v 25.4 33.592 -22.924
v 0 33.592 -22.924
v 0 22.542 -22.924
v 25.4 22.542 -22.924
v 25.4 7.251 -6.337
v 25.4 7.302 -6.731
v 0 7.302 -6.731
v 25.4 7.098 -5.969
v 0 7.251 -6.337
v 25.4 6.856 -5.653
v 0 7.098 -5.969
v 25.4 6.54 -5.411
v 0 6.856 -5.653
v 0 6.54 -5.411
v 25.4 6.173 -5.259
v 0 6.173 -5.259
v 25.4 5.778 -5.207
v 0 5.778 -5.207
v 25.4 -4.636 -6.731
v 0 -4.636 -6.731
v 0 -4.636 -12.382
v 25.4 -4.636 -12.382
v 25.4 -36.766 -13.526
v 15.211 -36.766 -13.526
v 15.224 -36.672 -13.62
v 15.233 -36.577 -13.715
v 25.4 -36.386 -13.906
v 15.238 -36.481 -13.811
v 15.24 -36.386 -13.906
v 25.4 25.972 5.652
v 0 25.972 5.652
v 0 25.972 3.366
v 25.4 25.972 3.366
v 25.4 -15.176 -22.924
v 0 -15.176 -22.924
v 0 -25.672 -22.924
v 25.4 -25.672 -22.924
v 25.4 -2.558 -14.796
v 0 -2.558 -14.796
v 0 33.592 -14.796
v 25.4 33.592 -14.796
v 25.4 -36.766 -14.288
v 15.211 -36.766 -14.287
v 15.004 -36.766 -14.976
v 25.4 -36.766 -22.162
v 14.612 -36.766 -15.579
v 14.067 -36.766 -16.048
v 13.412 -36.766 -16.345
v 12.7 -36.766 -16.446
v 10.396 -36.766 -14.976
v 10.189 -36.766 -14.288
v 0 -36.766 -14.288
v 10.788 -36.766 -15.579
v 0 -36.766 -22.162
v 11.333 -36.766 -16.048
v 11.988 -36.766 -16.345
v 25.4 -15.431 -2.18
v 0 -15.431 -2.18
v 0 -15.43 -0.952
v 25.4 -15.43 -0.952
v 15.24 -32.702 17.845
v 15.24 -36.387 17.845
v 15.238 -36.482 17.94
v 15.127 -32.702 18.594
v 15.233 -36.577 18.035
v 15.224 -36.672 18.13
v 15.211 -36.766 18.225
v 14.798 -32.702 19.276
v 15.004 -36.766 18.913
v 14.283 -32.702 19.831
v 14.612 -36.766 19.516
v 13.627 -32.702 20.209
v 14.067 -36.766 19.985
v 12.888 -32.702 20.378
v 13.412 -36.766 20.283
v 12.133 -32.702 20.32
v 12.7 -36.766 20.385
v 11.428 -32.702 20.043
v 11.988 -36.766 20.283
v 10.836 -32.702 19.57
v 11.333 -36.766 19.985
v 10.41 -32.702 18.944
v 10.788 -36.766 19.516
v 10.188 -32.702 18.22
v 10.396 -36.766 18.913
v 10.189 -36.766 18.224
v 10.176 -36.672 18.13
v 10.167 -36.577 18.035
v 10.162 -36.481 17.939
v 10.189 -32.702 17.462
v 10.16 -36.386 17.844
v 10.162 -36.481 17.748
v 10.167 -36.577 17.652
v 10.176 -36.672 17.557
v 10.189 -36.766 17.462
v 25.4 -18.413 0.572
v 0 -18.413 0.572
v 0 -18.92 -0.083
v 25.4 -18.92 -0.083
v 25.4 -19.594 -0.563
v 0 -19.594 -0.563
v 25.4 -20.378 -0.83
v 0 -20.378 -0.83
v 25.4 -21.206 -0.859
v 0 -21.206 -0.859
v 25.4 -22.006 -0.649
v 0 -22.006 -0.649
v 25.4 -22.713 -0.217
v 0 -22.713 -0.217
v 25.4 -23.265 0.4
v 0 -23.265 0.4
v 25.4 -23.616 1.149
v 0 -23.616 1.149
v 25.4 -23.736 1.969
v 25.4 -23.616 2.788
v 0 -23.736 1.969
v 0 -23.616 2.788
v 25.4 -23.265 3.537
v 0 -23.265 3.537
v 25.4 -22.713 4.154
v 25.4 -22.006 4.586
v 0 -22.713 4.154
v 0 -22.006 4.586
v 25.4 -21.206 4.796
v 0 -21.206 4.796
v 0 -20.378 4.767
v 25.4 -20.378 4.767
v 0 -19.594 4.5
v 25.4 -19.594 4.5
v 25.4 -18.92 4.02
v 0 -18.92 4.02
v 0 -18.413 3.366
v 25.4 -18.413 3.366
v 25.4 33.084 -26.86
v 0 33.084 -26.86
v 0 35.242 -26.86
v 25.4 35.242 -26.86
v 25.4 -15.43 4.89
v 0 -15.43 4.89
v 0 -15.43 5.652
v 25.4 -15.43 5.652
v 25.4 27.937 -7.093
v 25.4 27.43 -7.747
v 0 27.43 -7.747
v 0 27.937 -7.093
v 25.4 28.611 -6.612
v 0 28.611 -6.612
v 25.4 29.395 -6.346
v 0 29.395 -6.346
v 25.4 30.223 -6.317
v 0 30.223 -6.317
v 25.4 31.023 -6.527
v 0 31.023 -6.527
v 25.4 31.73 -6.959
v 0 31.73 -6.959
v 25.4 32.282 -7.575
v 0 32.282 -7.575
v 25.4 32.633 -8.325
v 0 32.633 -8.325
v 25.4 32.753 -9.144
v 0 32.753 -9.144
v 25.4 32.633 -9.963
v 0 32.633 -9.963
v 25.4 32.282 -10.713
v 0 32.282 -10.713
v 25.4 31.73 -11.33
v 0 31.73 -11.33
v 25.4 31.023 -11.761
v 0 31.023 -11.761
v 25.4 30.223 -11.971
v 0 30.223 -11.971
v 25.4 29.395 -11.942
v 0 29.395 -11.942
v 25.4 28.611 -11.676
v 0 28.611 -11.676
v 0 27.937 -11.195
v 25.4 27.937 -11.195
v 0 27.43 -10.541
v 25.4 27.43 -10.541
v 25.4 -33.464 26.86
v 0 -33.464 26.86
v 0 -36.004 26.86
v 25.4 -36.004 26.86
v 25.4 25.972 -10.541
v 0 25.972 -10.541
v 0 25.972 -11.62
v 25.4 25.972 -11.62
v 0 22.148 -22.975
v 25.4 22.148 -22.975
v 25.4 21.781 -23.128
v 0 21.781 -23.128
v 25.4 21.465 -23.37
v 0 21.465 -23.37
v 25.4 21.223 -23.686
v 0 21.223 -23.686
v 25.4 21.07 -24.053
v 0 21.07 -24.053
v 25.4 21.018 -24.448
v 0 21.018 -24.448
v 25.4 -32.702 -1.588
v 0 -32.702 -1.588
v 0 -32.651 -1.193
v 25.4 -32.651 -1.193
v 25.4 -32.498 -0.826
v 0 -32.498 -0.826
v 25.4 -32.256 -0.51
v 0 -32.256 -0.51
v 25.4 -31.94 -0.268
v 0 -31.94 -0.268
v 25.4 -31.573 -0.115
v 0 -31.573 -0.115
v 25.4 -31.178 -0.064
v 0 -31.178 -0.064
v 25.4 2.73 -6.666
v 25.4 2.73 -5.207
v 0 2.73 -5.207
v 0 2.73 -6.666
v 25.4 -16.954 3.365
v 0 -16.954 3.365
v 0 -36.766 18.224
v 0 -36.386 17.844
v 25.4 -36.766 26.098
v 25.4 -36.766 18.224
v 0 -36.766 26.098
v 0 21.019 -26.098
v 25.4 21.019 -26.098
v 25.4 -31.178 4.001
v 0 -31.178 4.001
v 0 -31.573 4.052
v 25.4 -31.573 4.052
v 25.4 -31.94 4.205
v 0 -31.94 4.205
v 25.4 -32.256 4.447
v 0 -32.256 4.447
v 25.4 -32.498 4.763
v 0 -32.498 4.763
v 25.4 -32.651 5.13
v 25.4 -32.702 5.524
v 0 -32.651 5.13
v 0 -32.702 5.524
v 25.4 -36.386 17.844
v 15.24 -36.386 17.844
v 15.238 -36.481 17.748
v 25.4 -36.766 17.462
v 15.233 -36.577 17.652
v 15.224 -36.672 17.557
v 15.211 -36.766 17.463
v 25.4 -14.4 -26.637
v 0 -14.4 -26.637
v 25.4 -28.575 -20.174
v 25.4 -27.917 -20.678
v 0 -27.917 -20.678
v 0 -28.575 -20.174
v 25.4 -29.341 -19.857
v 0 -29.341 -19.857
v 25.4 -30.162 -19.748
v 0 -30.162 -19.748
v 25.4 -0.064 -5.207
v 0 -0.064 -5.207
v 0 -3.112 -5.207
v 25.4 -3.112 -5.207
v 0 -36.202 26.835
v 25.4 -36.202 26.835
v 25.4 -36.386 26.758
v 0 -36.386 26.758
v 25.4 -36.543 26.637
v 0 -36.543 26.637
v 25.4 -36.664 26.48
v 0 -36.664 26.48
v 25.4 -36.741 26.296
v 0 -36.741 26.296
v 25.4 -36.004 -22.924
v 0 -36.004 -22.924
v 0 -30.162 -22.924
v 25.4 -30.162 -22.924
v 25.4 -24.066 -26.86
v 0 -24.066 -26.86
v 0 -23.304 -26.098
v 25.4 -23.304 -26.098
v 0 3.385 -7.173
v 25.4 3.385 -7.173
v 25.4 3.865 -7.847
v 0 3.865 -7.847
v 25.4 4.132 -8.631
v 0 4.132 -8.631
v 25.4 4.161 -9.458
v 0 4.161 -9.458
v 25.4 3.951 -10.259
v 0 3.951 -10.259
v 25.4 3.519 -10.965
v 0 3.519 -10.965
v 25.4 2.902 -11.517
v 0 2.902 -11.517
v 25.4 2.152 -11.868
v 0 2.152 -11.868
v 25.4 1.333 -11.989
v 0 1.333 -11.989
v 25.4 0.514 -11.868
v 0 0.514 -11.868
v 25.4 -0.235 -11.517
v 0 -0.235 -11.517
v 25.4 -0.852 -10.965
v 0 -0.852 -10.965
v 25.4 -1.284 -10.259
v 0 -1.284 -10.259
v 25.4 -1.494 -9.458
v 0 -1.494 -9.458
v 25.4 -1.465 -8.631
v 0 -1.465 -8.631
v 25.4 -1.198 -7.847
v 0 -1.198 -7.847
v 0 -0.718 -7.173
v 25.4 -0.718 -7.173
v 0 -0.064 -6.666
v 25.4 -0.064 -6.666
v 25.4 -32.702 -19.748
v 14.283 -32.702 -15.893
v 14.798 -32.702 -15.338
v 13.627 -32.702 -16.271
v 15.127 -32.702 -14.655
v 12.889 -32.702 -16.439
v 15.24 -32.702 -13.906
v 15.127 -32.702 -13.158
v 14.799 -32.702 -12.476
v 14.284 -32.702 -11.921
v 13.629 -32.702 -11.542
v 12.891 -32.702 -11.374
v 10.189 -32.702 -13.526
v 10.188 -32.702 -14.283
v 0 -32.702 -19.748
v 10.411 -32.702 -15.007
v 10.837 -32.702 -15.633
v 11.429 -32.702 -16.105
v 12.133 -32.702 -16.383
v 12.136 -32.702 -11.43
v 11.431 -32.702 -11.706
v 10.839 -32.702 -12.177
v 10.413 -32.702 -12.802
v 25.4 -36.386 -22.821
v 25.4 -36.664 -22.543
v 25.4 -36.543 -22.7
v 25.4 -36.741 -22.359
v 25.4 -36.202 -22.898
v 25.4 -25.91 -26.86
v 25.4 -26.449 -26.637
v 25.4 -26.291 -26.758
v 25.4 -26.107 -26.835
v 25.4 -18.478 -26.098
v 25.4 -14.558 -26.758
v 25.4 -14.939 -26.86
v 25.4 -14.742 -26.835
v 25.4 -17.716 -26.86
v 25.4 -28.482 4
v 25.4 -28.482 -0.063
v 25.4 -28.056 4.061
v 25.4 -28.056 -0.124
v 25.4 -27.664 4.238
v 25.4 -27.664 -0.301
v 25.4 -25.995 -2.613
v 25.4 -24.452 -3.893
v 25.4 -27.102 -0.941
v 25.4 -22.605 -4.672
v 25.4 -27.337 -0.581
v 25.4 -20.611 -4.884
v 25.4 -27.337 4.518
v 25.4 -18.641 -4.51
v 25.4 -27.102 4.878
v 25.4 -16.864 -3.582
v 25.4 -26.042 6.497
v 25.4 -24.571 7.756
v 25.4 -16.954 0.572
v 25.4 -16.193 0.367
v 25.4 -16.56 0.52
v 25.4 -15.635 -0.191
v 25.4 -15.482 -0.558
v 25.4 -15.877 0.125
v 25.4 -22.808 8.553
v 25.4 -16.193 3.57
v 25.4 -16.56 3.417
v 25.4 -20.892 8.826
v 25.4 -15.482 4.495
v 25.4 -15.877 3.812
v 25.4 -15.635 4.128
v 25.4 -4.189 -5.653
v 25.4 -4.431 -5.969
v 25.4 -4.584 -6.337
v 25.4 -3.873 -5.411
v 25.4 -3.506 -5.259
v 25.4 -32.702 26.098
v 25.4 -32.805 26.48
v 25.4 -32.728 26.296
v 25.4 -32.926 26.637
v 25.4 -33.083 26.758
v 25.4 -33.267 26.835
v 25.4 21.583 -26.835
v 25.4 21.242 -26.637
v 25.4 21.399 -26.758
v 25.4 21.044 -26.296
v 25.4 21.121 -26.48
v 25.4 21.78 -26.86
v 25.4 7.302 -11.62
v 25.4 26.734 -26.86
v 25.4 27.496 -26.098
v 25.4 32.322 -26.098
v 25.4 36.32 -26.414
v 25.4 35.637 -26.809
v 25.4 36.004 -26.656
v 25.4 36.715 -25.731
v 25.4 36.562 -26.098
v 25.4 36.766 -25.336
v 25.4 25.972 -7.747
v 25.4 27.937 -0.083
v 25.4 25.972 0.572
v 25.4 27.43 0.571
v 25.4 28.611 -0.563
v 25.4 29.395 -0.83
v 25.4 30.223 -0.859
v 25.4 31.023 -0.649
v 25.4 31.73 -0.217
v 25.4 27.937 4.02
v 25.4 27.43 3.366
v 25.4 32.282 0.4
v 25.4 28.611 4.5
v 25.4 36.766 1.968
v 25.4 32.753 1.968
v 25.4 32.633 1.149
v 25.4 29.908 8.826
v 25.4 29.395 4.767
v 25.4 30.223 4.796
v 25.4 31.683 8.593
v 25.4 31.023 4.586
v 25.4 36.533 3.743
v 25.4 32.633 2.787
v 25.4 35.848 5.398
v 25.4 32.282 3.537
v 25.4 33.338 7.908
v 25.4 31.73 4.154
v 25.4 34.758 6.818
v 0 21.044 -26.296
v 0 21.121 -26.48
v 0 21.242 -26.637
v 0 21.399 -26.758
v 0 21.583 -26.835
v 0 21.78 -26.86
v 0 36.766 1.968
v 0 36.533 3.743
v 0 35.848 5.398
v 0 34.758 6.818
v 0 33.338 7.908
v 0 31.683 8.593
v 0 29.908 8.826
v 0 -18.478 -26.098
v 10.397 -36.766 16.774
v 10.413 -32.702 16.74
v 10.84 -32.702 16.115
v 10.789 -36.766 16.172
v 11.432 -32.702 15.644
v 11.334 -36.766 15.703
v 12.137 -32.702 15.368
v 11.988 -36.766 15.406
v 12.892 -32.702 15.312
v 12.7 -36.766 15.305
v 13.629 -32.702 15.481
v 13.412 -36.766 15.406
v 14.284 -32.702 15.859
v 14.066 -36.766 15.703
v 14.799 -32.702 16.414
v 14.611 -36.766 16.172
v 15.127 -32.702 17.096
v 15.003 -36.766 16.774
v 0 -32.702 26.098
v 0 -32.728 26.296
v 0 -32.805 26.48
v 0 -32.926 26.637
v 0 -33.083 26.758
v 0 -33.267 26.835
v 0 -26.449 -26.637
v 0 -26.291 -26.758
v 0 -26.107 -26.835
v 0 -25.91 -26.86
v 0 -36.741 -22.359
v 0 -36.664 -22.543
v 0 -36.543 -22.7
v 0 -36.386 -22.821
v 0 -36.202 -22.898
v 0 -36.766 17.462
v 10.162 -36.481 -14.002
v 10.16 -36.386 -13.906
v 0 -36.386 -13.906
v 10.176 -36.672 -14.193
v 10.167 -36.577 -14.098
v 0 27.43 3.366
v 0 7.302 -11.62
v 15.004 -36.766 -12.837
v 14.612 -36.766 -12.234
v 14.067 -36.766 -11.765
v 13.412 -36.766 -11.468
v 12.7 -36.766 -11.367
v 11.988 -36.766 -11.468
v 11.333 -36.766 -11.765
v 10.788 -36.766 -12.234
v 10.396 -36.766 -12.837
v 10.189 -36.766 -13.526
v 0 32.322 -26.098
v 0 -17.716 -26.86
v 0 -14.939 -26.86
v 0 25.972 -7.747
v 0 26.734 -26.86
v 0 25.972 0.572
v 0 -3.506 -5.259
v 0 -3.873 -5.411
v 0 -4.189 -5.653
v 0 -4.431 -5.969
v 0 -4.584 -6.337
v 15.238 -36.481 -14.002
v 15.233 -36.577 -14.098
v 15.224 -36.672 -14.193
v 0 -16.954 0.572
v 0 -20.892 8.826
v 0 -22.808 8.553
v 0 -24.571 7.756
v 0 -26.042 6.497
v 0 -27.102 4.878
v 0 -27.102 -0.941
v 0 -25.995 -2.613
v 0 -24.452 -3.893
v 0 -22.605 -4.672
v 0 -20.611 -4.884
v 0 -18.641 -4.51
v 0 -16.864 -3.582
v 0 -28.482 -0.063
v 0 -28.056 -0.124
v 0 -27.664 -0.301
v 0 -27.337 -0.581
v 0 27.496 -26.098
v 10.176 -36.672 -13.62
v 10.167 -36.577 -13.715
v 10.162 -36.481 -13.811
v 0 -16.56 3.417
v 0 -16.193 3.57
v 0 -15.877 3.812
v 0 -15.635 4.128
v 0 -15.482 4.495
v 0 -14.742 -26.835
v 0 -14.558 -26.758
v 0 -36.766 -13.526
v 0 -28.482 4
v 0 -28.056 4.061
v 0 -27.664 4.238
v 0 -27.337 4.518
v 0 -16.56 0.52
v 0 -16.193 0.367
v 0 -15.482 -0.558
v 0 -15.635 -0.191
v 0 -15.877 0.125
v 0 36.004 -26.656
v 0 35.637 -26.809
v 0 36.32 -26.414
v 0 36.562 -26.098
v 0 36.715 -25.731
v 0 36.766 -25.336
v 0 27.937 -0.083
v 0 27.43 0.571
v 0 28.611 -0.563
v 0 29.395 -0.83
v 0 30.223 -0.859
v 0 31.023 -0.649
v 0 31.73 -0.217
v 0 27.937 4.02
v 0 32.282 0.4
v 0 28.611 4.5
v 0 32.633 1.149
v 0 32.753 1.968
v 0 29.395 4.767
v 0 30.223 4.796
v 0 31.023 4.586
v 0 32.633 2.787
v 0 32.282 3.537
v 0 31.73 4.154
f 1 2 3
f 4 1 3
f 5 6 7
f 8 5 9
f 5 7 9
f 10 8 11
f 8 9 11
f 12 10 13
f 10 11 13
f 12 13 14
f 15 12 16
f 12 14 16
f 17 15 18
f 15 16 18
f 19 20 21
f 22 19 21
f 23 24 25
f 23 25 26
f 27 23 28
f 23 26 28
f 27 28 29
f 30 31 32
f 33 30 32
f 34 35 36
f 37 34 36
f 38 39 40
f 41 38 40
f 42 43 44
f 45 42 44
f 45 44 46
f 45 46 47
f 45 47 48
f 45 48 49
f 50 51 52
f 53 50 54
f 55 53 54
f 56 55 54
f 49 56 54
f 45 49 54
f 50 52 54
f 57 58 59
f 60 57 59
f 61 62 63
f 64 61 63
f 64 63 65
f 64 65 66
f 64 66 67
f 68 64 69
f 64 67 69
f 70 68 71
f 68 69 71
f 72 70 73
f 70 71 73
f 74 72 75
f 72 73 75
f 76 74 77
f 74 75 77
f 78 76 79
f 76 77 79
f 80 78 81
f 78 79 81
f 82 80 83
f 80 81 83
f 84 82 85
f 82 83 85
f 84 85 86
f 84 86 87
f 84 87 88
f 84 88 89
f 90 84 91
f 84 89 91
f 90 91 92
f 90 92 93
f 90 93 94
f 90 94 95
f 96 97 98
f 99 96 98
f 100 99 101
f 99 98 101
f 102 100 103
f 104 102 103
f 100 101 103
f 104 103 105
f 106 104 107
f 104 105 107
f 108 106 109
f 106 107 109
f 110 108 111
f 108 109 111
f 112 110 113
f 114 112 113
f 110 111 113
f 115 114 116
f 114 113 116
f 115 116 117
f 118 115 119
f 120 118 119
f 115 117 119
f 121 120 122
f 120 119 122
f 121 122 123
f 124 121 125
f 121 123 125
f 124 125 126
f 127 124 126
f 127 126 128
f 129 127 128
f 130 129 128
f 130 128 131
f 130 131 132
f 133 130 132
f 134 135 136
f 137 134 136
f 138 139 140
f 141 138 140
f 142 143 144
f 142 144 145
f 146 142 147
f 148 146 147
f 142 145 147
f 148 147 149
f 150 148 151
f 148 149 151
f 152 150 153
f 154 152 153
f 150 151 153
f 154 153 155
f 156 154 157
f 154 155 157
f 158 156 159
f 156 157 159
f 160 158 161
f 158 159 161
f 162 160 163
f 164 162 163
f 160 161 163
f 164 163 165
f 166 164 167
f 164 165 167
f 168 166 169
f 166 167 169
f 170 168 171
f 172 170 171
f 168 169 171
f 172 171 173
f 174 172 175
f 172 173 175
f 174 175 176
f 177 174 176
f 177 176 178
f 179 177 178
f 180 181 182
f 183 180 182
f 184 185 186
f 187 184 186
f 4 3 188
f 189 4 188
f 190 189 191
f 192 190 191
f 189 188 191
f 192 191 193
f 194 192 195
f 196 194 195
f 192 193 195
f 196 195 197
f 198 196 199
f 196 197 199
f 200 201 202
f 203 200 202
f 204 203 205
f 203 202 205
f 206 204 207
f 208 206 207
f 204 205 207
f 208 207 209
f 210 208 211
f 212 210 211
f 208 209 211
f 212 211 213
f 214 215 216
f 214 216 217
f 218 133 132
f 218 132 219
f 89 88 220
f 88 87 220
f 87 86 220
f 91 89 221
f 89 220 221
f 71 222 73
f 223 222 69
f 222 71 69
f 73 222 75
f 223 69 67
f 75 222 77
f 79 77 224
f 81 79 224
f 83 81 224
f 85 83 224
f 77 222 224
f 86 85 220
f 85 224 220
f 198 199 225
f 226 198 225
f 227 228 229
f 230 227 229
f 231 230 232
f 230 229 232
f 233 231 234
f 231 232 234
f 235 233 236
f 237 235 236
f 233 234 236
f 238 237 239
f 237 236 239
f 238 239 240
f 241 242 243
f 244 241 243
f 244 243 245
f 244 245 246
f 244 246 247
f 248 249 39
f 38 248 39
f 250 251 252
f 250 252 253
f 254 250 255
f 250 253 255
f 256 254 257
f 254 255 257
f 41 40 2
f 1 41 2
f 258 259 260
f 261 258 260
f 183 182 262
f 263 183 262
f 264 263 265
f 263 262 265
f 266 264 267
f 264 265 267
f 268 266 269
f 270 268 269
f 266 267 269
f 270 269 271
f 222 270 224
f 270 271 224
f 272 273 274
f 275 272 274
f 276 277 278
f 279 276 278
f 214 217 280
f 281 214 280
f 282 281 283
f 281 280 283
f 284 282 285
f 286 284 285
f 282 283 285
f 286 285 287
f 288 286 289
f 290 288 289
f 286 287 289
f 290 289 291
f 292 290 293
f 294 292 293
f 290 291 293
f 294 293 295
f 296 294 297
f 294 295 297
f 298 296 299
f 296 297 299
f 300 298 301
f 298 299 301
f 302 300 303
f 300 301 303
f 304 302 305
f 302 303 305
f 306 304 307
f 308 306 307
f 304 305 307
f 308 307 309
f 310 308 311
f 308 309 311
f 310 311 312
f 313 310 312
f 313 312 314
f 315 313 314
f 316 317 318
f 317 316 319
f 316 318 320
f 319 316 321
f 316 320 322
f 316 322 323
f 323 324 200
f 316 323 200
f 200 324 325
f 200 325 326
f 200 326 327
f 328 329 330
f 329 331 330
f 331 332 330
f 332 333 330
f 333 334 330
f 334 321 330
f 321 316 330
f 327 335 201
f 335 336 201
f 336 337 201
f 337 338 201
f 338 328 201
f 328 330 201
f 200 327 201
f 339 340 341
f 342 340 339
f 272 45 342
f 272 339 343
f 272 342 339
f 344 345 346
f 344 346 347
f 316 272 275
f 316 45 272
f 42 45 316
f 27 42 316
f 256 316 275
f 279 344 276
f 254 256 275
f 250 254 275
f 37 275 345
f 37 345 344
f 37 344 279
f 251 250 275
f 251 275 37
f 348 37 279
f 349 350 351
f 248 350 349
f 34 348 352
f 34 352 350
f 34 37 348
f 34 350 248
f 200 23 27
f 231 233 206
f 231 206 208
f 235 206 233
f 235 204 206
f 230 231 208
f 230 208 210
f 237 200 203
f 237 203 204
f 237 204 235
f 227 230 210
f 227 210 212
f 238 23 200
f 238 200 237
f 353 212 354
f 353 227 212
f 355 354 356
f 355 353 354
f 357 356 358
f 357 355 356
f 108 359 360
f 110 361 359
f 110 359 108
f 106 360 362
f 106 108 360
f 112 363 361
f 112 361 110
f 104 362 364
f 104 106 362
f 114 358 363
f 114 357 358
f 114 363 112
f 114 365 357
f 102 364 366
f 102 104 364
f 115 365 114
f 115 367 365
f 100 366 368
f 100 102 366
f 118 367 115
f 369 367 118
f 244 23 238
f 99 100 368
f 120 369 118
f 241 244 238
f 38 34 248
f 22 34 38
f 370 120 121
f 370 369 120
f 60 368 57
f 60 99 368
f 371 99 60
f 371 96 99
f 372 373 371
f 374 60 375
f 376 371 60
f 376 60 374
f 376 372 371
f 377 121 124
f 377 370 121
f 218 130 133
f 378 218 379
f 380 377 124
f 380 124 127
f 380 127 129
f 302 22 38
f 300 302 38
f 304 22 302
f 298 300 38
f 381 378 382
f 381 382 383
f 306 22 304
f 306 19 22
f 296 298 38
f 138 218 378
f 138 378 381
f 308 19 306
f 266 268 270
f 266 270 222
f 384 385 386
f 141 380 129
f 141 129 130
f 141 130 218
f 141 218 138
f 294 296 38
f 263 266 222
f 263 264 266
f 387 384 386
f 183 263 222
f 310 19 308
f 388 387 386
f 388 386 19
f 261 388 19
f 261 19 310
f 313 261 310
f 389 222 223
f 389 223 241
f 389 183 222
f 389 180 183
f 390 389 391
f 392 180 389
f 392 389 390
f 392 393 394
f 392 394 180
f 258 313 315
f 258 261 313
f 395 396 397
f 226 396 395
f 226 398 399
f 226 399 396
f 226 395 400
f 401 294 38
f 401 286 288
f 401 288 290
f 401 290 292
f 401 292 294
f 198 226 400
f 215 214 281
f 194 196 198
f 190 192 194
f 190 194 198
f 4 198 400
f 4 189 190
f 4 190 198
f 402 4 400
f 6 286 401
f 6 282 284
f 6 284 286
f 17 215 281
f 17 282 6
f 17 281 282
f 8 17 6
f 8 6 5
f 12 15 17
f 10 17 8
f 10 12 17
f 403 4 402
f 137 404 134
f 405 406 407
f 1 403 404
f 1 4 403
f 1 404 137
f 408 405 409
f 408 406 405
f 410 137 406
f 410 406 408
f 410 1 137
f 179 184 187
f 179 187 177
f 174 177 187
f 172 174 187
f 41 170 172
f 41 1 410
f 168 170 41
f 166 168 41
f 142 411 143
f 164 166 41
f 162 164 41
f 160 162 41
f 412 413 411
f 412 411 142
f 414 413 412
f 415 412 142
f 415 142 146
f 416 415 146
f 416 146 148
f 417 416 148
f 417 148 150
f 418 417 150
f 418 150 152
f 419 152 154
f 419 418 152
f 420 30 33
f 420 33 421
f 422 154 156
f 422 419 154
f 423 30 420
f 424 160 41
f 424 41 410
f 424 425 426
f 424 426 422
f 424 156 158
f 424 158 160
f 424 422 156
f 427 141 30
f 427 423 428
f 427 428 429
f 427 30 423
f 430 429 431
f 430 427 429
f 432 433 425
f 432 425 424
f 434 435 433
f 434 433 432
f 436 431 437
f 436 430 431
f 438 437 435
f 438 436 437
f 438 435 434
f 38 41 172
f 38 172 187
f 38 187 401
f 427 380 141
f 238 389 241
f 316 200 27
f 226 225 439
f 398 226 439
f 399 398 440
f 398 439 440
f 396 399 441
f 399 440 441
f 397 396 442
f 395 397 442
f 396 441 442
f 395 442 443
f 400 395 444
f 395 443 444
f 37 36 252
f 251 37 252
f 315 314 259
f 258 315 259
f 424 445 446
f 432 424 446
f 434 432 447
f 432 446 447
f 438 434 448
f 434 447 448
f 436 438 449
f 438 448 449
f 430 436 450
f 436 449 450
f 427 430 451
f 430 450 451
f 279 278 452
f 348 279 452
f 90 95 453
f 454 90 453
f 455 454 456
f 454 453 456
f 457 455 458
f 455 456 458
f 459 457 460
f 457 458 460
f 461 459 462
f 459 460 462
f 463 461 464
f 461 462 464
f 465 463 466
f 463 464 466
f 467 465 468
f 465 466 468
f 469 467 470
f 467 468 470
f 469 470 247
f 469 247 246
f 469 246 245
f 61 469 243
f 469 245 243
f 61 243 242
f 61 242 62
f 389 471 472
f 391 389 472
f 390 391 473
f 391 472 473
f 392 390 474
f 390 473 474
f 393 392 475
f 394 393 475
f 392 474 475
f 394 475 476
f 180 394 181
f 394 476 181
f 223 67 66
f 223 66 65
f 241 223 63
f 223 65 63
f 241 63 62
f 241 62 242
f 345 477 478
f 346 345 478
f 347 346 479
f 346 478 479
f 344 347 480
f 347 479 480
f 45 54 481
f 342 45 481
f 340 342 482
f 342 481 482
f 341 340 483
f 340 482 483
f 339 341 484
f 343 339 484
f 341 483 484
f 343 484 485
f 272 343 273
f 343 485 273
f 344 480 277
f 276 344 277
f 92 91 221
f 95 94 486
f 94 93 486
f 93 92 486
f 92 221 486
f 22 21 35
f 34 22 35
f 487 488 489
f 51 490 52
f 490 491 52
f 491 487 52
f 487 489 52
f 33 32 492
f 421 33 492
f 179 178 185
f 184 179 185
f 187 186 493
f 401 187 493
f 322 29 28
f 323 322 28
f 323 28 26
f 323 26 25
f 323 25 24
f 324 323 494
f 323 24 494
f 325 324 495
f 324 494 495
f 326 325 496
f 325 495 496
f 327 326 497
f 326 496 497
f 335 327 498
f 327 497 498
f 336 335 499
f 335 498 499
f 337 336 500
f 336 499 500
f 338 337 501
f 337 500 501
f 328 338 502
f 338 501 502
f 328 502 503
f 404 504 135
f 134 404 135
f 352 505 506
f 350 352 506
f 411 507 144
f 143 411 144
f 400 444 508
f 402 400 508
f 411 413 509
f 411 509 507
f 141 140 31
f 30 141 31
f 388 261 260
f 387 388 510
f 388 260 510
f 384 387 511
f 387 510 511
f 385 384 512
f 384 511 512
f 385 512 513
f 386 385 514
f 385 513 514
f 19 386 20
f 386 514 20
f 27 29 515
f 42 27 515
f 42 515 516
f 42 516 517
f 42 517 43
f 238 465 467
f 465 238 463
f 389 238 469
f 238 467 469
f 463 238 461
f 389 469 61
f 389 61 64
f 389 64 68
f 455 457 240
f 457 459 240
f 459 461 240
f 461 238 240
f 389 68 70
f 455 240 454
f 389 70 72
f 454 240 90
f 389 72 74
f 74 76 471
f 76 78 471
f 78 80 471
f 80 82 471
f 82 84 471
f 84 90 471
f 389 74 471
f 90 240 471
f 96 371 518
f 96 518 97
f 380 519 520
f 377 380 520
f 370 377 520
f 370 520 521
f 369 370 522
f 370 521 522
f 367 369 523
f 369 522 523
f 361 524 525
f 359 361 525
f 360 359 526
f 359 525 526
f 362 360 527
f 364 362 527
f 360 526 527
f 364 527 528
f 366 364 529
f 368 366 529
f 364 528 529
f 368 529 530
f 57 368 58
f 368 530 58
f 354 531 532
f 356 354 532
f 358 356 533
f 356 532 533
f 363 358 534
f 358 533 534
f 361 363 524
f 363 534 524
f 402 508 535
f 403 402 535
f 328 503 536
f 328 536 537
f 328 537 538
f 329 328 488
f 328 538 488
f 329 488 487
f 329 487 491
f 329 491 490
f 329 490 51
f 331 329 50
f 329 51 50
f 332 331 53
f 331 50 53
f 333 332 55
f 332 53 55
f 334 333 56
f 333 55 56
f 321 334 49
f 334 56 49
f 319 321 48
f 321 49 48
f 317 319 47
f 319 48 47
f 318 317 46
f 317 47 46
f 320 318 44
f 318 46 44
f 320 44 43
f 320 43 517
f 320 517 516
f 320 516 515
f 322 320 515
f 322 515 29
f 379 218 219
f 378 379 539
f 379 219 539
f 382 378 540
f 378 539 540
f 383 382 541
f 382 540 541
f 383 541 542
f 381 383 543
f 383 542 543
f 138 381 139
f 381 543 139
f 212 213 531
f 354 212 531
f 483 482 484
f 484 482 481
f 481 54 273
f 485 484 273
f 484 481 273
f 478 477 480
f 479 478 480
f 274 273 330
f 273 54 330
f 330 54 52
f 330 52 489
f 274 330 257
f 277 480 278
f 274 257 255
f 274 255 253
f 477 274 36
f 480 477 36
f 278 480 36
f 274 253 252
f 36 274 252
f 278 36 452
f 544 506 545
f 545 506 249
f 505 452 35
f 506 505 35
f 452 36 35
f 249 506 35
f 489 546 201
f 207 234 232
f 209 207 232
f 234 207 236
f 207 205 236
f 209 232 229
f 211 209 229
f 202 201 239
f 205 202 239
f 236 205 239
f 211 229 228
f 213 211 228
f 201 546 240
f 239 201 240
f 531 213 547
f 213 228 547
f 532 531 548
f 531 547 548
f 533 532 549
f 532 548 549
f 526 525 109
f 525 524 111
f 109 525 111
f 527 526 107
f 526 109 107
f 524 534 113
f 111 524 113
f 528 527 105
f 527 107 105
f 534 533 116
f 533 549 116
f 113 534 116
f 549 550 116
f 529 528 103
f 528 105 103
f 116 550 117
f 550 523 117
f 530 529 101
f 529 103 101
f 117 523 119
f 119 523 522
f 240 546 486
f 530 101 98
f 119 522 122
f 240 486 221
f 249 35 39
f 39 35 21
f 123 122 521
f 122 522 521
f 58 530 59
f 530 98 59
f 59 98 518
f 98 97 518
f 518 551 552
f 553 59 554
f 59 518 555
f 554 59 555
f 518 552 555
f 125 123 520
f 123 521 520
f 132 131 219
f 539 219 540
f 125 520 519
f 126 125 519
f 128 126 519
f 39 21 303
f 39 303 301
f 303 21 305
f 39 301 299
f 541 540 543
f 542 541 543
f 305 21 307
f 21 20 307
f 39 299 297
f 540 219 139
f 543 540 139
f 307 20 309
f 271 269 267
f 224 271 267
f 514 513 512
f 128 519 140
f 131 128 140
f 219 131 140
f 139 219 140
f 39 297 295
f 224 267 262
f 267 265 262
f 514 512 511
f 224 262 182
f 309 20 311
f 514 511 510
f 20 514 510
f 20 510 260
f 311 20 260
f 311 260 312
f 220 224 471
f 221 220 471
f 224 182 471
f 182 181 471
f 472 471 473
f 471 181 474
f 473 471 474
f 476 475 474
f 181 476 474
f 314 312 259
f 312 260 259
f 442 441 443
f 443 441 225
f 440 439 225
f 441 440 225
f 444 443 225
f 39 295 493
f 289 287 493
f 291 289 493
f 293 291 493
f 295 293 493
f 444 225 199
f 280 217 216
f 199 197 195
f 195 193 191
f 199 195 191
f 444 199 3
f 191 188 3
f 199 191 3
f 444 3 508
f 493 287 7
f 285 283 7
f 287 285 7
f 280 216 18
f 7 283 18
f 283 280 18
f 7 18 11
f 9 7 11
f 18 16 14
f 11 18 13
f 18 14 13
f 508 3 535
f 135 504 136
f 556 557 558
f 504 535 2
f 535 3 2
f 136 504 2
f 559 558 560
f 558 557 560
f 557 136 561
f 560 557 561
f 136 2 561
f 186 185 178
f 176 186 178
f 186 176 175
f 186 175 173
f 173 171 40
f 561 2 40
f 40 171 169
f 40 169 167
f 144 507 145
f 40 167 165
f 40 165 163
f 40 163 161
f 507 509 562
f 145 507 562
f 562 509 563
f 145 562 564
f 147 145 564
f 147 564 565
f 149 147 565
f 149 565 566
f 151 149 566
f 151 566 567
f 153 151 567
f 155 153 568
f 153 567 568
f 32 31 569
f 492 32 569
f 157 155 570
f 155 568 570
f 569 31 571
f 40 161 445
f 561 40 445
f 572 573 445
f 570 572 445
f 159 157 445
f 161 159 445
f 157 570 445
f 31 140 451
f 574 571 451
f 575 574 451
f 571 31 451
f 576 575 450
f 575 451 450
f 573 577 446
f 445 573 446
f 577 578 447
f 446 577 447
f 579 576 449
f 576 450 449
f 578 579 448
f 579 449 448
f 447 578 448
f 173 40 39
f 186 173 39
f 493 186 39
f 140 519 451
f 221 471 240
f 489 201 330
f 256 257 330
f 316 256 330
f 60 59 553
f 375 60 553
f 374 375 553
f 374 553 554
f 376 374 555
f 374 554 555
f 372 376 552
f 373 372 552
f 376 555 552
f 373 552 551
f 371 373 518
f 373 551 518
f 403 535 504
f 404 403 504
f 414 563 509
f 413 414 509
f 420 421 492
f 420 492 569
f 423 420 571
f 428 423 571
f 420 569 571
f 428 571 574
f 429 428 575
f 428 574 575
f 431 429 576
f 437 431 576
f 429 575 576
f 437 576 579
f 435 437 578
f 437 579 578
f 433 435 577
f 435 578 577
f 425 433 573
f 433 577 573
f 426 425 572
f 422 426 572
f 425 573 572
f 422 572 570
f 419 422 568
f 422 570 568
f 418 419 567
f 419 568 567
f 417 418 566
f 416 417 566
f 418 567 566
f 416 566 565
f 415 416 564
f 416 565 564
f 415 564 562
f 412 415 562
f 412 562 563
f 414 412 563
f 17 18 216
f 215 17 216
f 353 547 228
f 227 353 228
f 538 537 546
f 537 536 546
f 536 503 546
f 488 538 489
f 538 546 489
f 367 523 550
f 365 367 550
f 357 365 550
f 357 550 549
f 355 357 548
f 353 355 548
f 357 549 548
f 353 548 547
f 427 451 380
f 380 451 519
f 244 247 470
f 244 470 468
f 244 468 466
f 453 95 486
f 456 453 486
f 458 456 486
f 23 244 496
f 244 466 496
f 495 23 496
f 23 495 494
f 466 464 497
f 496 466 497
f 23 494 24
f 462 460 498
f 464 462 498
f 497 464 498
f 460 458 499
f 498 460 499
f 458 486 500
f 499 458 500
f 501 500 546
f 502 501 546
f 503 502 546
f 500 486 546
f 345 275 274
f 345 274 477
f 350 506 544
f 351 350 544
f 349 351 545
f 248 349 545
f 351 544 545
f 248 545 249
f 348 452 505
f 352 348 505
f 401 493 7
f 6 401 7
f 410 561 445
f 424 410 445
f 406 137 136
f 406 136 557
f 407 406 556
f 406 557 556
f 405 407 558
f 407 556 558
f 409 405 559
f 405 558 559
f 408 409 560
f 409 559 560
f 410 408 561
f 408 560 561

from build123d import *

# Parameters (mm, degrees)
F1_DEPTH = 25.4
F3_DEPTH = 25.4


# Not quite as in the source:
# - ends of sketch curves that miss each other by under 0.0002 mm in the source are joined


with BuildPart() as f1:
    # F0 (on Right) → F1 (new body)
    with BuildSketch(Plane.YZ):
        with BuildLine():
            Line((-36.7665, 26.0985), (-36.7665, 18.2245))
            Line((-36.7665, 18.2245), (-36.3855, 17.8435))
            Line((-36.3855, 17.8435), (-36.7665, 17.4625))
            Line((-36.7665, 17.4625), (-36.7665, -13.5255))
            Line((-36.7665, -13.5255), (-36.3855, -13.9065))
            Line((-36.3855, -13.9065), (-36.7665, -14.2875))
            Line((-36.7665, -14.2875), (-36.7665, -22.1615))
            ThreePointArc((-36.7665, -22.1615), (-36.5433153673, -22.7003153673), (-36.0045, -22.9235))
            Line((-36.0045, -22.9235), (-30.1625, -22.9235))
            Line((-30.1625, -22.9235), (-26.4486898, -26.6373356))
            ThreePointArc((-26.4486898, -26.6373356), (-26.2014589755, -26.8024962038), (-25.9098542, -26.8605))
            Line((-25.9098542, -26.8605), (-24.0665, -26.8605))
            Line((-24.0665, -26.8605), (-23.3045, -26.0985))
            Line((-23.3045, -26.0985), (-18.4785, -26.0985))
            Line((-18.4785, -26.0985), (-17.7165, -26.8605))
            Line((-17.7165, -26.8605), (-14.9389846, -26.8605))
            ThreePointArc((-14.9389846, -26.8605), (-14.6473881211, -26.8024996403), (-14.4001819327, -26.6373280669))
            Line((-14.4001819327, -26.6373280669), (-2.5583642, -14.7955))
            Line((-2.5583642, -14.7955), (33.5915, -14.7955))
            Line((33.5915, -14.7955), (33.5915, -22.9235))
            Line((33.5915, -22.9235), (22.5425, -22.9235))
            ThreePointArc((22.5425, -22.9235), (21.4648692655, -23.3698692655), (21.0185, -24.4475))
            Line((21.0185, -24.4475), (21.0185, -26.0985))
            ThreePointArc((21.0185, -26.0985), (21.2416846327, -26.6373153673), (21.7805, -26.8605))
            Line((21.7805, -26.8605), (26.7335, -26.8605))
            Line((26.7335, -26.8605), (27.4955, -26.0985))
            Line((27.4955, -26.0985), (32.3215, -26.0985))
            Line((32.3215, -26.0985), (33.0835, -26.8605))
            Line((33.0835, -26.8605), (35.2425, -26.8605))
            ThreePointArc((35.2425, -26.8605), (36.3201307345, -26.4141307345), (36.7665, -25.3365))
            Line((36.7665, -25.3365), (36.7665, 1.9685))
            ThreePointArc((36.7665, 1.9685), (34.7578383054, 6.8178383054), (29.9085, 8.8265))
            Line((29.9085, 8.8265), (-20.8915, 8.8265))
            ThreePointArc((-20.8915, 8.8265), (-24.5711182212, 7.7557768852), (-27.1017564824, 4.8779464117))
            ThreePointArc((-27.1017564824, 4.8779464117), (-27.6641193484, 4.2384353631), (-28.4818074, 4.0005))
            Line((-28.4818074, 4.0005), (-31.1785, 4.0005))
            ThreePointArc((-31.1785, 4.0005), (-32.2561307345, 4.4468692655), (-32.7025, 5.5245))
            Line((-32.7025, 5.5245), (-32.7025, 26.0985))
            ThreePointArc((-32.7025, 26.0985), (-32.9256846327, 26.6373153673), (-33.4645, 26.8605))
            Line((-33.4645, 26.8605), (-36.0045, 26.8605))
            ThreePointArc((-36.0045, 26.8605), (-36.5433153673, 26.6373153673), (-36.7665, 26.0985))
        make_face()
        with BuildLine():
            Line((-18.4133236, 3.3655), (-16.9545, 3.3655))
            ThreePointArc((-16.9545, 3.3655), (-15.8768692655, 3.8118692655), (-15.4305, 4.8895))
            Line((-15.4305, 4.8895), (-15.4305, 5.6515))
            Line((-15.4305, 5.6515), (25.9715, 5.6515))
            Line((25.9715, 5.6515), (25.9715, 3.3655))
            Line((25.9715, 3.3655), (27.430349, 3.3655))
            ThreePointArc((27.430349, 3.3655), (32.7533, 1.9685), (27.4303420089, 0.5714960589))
            Line((27.4303420089, 0.5714960589), (25.9715, 0.5715))
            Line((25.9715, 0.5715), (25.9715, -7.747))
            Line((25.9715, -7.747), (27.430349, -7.747))
            ThreePointArc((27.430349, -7.747), (32.7533, -9.144), (27.4303420089, -10.5410039411))
            Line((27.4303420089, -10.5410039411), (25.9715, -10.541))
            Line((25.9715, -10.541), (25.9715, -11.6205))
            Line((25.9715, -11.6205), (7.3025, -11.6205))
            Line((7.3025, -11.6205), (7.3025, -6.731))
            ThreePointArc((7.3025, -6.731), (6.8561307345, -5.6533692655), (5.7785, -5.207))
            Line((5.7785, -5.207), (2.7305, -5.207))
            Line((2.7305, -5.207), (2.7305, -6.665849))
            ThreePointArc((2.7305, -6.665849), (1.3335, -11.9888), (-0.0635039411, -6.6658420089))
            Line((-0.0635039411, -6.6658420089), (-0.0635, -5.207))
            Line((-0.0635, -5.207), (-3.1115, -5.207))
            ThreePointArc((-3.1115, -5.207), (-4.1891307345, -5.6533692655), (-4.6355, -6.731))
            Line((-4.6355, -6.731), (-4.6355, -12.3825))
            Line((-4.6355, -12.3825), (-15.1765, -22.9235))
            Line((-15.1765, -22.9235), (-25.6723642, -22.9235))
            Line((-25.6723642, -22.9235), (-27.9174194, -20.6784448))
            ThreePointArc((-27.9174194, -20.6784448), (-28.9474718056, -19.9901859209), (-30.1625, -19.7485))
            Line((-30.1625, -19.7485), (-32.7025, -19.7485))
            Line((-32.7025, -19.7485), (-32.7025, -1.5875))
            ThreePointArc((-32.7025, -1.5875), (-32.2561307345, -0.5098692655), (-31.1785, -0.0635))
            Line((-31.1785, -0.0635), (-28.4818074, -0.0635))
            ThreePointArc((-28.4818074, -0.0635), (-27.6641096434, -0.3014415336), (-27.1017455591, -0.9409666943))
            ThreePointArc((-27.1017455591, -0.9409666943), (-21.615457962, -4.8511809947), (-15.4305020835, -2.1799534173))
            Line((-15.4305020835, -2.1799534173), (-15.4305, -0.9525))
            ThreePointArc((-15.4305, -0.9525), (-15.8768692655, 0.1251307345), (-16.9545, 0.5715))
            Line((-16.9545, 0.5715), (-18.4133236, 0.5715))
            ThreePointArc((-18.4133236, 0.5715), (-23.7363, 1.9685), (-18.4133236, 3.3655))
        make_face(mode=Mode.SUBTRACT)
    extrude(amount=F1_DEPTH)

    # F2 (on face) → F3 (cut)
    with BuildSketch(Plane.XZ.offset(36.7665)):
        with BuildLine():
            ThreePointArc((10.1889011104, 17.4625), (12.8915839509, 15.311811972), (15.24, 17.8445763886))
            ThreePointArc((15.24, 17.8445763886), (12.5084160491, 20.3773408052), (10.1889011104, 17.4625))
        make_face()
        with BuildLine():
            ThreePointArc((10.1887375685, -13.5255), (12.5089588736, -16.4393054185), (15.24, -13.9065))
            ThreePointArc((15.24, -13.9065), (12.8910411264, -11.3736945815), (10.1887375685, -13.5255))
        make_face()
    extrude(amount=-F3_DEPTH, mode=Mode.SUBTRACT)


solid = f1.part
